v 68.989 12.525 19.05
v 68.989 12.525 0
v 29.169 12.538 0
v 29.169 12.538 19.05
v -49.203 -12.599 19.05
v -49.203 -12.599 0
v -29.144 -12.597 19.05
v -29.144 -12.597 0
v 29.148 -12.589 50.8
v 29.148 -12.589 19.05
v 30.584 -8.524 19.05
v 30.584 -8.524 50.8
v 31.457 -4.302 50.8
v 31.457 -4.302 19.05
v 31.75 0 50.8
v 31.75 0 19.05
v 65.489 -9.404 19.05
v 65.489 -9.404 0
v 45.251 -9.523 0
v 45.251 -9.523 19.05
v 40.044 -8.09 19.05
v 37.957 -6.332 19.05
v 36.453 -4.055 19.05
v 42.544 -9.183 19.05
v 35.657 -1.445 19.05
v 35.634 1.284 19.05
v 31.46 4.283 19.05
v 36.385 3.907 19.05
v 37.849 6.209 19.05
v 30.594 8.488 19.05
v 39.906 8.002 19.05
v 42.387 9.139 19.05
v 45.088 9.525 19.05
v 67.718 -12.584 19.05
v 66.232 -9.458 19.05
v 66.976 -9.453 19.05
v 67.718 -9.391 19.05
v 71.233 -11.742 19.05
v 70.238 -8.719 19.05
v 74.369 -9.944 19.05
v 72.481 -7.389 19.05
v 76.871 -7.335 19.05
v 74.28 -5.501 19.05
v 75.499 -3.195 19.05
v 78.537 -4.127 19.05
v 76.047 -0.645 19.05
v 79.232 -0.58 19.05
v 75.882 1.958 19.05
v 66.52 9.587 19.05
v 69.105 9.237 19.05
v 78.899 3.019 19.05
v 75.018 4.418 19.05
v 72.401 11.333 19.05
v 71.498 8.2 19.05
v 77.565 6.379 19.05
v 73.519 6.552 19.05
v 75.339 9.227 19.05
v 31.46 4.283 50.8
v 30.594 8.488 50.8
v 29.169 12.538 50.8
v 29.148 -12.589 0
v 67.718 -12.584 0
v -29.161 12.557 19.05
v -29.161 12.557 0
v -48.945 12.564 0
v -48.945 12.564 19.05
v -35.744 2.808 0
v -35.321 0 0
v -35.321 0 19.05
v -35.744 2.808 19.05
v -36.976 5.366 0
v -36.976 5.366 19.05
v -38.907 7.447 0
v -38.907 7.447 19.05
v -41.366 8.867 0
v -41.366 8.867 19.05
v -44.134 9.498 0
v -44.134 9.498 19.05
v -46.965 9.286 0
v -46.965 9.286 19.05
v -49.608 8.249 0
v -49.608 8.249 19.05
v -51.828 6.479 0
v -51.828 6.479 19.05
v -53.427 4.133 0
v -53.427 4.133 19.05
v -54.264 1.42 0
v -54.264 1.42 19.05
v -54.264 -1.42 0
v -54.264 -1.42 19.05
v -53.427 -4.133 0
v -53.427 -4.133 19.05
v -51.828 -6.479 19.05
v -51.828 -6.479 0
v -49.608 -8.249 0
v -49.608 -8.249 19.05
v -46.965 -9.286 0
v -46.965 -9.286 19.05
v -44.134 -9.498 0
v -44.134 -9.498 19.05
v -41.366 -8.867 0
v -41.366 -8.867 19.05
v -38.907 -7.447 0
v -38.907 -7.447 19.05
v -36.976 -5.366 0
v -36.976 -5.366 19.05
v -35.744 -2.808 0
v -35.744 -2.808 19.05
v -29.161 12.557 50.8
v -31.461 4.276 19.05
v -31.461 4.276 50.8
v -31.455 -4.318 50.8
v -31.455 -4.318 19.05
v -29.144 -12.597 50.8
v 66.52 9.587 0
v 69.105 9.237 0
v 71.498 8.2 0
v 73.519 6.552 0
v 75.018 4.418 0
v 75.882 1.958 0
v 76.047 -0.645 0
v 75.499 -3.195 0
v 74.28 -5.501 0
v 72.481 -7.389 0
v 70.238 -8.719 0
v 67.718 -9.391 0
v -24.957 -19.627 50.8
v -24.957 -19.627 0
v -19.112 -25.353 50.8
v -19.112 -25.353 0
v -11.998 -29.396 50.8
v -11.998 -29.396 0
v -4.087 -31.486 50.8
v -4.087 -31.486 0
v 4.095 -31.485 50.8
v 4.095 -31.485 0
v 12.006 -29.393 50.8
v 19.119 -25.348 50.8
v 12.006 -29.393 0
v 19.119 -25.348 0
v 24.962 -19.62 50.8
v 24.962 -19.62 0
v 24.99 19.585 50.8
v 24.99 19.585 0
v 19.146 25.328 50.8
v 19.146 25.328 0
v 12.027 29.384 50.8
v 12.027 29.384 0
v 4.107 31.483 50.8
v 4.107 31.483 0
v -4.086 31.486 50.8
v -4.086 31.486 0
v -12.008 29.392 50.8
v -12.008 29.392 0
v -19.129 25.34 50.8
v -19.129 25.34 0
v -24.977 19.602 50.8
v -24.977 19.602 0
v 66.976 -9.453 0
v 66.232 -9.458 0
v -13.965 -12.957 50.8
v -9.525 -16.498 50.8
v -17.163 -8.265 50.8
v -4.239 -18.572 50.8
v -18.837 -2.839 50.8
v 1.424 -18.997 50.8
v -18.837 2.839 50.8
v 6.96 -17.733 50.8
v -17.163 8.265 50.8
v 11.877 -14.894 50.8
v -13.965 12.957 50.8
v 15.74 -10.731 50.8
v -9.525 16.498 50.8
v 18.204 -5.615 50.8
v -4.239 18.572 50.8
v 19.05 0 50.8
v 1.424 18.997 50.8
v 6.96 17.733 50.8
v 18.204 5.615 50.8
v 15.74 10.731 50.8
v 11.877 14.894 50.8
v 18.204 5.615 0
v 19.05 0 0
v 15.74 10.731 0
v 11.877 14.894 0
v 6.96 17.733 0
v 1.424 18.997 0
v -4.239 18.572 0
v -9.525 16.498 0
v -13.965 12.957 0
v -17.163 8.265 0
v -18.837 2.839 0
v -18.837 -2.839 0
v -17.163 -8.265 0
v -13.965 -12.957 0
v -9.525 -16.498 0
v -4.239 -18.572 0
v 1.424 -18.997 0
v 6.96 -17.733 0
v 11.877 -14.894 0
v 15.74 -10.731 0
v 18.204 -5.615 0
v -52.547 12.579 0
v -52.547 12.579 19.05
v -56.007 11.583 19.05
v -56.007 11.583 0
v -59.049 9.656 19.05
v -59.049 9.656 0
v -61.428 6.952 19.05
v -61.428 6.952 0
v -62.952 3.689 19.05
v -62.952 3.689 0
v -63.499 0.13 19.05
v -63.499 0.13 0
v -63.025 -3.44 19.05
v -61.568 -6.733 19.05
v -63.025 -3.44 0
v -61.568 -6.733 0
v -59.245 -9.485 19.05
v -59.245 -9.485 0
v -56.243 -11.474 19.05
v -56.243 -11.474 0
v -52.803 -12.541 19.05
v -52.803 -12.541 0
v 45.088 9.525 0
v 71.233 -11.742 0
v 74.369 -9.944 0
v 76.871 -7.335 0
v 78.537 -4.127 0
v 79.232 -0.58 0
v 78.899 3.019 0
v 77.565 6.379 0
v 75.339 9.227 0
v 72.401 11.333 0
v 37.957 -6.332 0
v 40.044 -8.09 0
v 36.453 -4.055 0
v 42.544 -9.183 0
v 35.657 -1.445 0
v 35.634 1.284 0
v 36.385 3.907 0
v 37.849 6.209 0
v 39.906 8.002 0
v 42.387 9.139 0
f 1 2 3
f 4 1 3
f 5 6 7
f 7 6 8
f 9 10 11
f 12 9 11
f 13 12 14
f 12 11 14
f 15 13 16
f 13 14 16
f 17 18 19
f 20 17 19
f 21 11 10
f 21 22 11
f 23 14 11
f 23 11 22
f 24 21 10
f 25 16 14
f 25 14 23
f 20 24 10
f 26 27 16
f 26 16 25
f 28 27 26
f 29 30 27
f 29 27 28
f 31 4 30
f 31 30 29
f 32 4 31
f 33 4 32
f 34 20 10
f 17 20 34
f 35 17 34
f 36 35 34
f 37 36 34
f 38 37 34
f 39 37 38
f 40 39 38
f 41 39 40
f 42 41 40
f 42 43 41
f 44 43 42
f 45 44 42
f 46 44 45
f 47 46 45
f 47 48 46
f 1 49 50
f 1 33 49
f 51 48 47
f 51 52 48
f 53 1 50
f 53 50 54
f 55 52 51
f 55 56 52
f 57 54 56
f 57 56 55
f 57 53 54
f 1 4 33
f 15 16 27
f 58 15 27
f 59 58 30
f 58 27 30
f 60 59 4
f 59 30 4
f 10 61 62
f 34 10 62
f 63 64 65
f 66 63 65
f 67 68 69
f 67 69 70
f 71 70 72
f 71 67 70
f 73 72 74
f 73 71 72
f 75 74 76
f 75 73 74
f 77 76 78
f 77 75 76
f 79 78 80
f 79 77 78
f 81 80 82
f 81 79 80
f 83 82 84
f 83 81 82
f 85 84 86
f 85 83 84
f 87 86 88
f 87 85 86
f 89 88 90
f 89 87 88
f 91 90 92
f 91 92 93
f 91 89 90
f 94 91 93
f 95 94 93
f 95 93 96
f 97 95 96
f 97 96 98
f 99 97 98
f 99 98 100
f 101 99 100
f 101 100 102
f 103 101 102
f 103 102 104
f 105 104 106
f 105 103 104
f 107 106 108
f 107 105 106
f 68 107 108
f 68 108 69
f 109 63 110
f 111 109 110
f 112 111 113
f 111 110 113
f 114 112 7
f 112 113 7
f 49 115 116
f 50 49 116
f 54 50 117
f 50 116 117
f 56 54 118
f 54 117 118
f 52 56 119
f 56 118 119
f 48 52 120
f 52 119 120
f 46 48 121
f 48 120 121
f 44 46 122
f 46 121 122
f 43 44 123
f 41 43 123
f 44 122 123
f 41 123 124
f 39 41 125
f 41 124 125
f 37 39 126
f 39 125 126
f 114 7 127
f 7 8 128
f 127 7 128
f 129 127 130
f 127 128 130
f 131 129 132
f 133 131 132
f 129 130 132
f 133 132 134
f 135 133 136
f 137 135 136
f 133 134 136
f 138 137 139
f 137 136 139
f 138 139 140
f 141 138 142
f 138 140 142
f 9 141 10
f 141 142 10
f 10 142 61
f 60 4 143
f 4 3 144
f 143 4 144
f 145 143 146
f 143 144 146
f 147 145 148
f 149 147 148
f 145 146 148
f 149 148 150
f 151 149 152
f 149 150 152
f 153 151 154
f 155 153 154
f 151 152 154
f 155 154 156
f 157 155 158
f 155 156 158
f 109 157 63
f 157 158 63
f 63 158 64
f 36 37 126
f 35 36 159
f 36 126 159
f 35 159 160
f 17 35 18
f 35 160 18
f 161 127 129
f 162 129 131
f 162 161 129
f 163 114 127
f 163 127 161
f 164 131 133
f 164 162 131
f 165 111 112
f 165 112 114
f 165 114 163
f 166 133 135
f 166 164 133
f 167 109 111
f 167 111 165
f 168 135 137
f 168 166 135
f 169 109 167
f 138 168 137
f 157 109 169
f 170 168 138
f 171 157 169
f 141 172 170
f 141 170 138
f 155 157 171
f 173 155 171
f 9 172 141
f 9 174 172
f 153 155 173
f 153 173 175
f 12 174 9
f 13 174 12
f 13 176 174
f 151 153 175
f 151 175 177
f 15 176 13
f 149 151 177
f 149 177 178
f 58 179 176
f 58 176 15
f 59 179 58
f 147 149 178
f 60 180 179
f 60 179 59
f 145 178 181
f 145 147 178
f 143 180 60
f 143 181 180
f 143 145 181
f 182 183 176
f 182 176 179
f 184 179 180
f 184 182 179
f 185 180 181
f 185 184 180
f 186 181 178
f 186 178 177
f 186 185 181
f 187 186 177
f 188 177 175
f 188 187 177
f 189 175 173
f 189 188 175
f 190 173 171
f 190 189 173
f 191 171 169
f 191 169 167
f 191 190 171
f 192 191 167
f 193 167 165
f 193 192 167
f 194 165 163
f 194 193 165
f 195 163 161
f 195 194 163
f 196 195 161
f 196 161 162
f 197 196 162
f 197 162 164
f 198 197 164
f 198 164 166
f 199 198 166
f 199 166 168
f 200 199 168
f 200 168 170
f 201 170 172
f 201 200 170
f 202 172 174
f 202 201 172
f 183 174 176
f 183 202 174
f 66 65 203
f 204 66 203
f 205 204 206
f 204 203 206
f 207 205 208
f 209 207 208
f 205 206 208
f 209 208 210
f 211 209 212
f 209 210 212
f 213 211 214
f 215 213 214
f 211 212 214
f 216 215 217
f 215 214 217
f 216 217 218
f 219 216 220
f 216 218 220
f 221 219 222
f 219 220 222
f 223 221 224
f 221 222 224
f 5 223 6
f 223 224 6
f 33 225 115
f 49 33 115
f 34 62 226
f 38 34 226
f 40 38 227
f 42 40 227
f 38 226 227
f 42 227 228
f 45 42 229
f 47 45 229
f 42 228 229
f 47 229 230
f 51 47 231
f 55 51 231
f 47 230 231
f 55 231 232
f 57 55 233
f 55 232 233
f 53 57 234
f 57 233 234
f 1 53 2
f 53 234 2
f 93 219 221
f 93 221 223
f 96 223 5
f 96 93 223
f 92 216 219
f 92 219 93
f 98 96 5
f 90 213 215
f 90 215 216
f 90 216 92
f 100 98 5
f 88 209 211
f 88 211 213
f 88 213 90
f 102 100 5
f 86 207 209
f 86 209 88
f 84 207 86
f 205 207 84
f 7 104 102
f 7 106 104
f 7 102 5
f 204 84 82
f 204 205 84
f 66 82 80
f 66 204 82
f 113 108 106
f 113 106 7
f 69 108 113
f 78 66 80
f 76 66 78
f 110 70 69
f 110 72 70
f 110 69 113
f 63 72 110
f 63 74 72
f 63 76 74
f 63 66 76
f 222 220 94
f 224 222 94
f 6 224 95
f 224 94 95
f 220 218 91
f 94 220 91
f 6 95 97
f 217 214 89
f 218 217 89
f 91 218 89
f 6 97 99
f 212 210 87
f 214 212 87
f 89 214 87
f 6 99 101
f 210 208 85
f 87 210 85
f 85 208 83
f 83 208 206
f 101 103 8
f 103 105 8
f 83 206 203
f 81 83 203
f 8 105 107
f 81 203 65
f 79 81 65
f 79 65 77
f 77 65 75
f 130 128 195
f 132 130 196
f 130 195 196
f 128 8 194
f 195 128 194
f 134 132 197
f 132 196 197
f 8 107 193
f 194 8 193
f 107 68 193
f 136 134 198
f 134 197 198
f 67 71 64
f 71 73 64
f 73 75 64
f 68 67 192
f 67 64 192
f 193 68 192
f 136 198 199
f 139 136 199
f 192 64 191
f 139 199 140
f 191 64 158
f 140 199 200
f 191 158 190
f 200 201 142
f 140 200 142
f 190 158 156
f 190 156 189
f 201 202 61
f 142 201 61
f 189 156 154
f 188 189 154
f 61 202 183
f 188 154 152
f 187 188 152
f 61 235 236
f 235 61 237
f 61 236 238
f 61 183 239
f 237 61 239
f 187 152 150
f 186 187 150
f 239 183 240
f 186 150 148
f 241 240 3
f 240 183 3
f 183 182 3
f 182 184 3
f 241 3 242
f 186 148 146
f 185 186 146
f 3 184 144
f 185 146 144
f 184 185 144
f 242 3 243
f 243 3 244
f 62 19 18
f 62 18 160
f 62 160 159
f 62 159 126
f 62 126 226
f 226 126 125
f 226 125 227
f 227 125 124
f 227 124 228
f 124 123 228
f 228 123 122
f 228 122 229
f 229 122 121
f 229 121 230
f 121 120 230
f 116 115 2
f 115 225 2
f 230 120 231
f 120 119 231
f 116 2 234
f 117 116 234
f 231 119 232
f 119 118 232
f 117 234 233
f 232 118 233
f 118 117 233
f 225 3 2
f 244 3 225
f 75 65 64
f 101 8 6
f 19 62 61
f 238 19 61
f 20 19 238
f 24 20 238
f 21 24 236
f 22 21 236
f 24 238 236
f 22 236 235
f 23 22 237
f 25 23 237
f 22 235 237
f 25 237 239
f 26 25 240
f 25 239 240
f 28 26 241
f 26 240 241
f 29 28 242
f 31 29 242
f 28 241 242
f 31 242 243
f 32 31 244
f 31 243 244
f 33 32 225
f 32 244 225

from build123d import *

# Parameters (mm, degrees)
F0_R     = 19.05
F1_DEPTH = 50.8
F0_R_2   = 9.525
F2_DEPTH = 19.05
F3_DEPTH = 19.05


with BuildPart() as f1:
    # F0 (on Top) → F1 (new body)
    with BuildSketch(Plane.XY):
        with BuildLine():
            ThreePointArc((29.147548, -12.589001), (31.092581, -6.427591), (31.75, 0))
            ThreePointArc((31.75, 0), (31.098159, 6.400547), (29.169401, 12.538283))
            ThreePointArc((29.169401, 12.538283), (0.010397, 31.749998), (-29.161183, 12.557384))
            ThreePointArc((-29.161183, 12.557384), (-31.749993, -0.021323), (-29.14429, -12.596541))
            ThreePointArc((-29.14429, -12.596541), (0.004107, -31.75), (29.147548, -12.589001))
        make_face()
        Circle(F0_R, mode=Mode.SUBTRACT)
    extrude(amount=F1_DEPTH)

    # F0 (on Top) → F2 (join)
    with BuildSketch(Plane.XY):
        with BuildLine():
            ThreePointArc((-29.14429, -12.596541), (-31.749993, -0.021323), (-29.161183, 12.557384))
            Line((-29.161183, 12.557384), (-48.945453, 12.563863))
            ThreePointArc((-48.945453, 12.563863), (-63.499337, 0.129762), (-49.202569, -12.599135))
            Line((-49.202569, -12.599135), (-29.14429, -12.596541))
        make_face()
        with Locations((-44.845603, 0)):
            Circle(F0_R_2, mode=Mode.SUBTRACT)
    extrude(amount=F2_DEPTH)

    # F0 (on Top) → F3 (join)
    with BuildSketch(Plane.XY):
        with BuildLine():
            ThreePointArc((29.169401, 12.538283), (31.098159, 6.400547), (31.75, 0))
            ThreePointArc((31.75, 0), (31.092581, -6.427591), (29.147548, -12.589001))
            Line((29.147548, -12.589001), (67.717979, -12.584012))
            ThreePointArc((67.717979, -12.584012), (79.23174, -0.579906), (68.988677, 12.525243))
            Line((68.988677, 12.525243), (29.169401, 12.538283))
        make_face()
        with BuildLine():
            ThreePointArc((67.717979, -9.390889), (66.604114, -9.462856), (65.489479, -9.404025))
            Line((65.489479, -9.404025), (45.251264, -9.523317))
            ThreePointArc((45.251264, -9.523317), (35.54757, -0.081586), (45.088101, 9.524987))
            Line((45.088101, 9.524987), (66.520438, 9.586939))
            ThreePointArc((66.520438, 9.586939), (76.054064, 0.661833), (67.717979, -9.390889))
        make_face(mode=Mode.SUBTRACT)
    extrude(amount=F3_DEPTH)


solid = f1.part
